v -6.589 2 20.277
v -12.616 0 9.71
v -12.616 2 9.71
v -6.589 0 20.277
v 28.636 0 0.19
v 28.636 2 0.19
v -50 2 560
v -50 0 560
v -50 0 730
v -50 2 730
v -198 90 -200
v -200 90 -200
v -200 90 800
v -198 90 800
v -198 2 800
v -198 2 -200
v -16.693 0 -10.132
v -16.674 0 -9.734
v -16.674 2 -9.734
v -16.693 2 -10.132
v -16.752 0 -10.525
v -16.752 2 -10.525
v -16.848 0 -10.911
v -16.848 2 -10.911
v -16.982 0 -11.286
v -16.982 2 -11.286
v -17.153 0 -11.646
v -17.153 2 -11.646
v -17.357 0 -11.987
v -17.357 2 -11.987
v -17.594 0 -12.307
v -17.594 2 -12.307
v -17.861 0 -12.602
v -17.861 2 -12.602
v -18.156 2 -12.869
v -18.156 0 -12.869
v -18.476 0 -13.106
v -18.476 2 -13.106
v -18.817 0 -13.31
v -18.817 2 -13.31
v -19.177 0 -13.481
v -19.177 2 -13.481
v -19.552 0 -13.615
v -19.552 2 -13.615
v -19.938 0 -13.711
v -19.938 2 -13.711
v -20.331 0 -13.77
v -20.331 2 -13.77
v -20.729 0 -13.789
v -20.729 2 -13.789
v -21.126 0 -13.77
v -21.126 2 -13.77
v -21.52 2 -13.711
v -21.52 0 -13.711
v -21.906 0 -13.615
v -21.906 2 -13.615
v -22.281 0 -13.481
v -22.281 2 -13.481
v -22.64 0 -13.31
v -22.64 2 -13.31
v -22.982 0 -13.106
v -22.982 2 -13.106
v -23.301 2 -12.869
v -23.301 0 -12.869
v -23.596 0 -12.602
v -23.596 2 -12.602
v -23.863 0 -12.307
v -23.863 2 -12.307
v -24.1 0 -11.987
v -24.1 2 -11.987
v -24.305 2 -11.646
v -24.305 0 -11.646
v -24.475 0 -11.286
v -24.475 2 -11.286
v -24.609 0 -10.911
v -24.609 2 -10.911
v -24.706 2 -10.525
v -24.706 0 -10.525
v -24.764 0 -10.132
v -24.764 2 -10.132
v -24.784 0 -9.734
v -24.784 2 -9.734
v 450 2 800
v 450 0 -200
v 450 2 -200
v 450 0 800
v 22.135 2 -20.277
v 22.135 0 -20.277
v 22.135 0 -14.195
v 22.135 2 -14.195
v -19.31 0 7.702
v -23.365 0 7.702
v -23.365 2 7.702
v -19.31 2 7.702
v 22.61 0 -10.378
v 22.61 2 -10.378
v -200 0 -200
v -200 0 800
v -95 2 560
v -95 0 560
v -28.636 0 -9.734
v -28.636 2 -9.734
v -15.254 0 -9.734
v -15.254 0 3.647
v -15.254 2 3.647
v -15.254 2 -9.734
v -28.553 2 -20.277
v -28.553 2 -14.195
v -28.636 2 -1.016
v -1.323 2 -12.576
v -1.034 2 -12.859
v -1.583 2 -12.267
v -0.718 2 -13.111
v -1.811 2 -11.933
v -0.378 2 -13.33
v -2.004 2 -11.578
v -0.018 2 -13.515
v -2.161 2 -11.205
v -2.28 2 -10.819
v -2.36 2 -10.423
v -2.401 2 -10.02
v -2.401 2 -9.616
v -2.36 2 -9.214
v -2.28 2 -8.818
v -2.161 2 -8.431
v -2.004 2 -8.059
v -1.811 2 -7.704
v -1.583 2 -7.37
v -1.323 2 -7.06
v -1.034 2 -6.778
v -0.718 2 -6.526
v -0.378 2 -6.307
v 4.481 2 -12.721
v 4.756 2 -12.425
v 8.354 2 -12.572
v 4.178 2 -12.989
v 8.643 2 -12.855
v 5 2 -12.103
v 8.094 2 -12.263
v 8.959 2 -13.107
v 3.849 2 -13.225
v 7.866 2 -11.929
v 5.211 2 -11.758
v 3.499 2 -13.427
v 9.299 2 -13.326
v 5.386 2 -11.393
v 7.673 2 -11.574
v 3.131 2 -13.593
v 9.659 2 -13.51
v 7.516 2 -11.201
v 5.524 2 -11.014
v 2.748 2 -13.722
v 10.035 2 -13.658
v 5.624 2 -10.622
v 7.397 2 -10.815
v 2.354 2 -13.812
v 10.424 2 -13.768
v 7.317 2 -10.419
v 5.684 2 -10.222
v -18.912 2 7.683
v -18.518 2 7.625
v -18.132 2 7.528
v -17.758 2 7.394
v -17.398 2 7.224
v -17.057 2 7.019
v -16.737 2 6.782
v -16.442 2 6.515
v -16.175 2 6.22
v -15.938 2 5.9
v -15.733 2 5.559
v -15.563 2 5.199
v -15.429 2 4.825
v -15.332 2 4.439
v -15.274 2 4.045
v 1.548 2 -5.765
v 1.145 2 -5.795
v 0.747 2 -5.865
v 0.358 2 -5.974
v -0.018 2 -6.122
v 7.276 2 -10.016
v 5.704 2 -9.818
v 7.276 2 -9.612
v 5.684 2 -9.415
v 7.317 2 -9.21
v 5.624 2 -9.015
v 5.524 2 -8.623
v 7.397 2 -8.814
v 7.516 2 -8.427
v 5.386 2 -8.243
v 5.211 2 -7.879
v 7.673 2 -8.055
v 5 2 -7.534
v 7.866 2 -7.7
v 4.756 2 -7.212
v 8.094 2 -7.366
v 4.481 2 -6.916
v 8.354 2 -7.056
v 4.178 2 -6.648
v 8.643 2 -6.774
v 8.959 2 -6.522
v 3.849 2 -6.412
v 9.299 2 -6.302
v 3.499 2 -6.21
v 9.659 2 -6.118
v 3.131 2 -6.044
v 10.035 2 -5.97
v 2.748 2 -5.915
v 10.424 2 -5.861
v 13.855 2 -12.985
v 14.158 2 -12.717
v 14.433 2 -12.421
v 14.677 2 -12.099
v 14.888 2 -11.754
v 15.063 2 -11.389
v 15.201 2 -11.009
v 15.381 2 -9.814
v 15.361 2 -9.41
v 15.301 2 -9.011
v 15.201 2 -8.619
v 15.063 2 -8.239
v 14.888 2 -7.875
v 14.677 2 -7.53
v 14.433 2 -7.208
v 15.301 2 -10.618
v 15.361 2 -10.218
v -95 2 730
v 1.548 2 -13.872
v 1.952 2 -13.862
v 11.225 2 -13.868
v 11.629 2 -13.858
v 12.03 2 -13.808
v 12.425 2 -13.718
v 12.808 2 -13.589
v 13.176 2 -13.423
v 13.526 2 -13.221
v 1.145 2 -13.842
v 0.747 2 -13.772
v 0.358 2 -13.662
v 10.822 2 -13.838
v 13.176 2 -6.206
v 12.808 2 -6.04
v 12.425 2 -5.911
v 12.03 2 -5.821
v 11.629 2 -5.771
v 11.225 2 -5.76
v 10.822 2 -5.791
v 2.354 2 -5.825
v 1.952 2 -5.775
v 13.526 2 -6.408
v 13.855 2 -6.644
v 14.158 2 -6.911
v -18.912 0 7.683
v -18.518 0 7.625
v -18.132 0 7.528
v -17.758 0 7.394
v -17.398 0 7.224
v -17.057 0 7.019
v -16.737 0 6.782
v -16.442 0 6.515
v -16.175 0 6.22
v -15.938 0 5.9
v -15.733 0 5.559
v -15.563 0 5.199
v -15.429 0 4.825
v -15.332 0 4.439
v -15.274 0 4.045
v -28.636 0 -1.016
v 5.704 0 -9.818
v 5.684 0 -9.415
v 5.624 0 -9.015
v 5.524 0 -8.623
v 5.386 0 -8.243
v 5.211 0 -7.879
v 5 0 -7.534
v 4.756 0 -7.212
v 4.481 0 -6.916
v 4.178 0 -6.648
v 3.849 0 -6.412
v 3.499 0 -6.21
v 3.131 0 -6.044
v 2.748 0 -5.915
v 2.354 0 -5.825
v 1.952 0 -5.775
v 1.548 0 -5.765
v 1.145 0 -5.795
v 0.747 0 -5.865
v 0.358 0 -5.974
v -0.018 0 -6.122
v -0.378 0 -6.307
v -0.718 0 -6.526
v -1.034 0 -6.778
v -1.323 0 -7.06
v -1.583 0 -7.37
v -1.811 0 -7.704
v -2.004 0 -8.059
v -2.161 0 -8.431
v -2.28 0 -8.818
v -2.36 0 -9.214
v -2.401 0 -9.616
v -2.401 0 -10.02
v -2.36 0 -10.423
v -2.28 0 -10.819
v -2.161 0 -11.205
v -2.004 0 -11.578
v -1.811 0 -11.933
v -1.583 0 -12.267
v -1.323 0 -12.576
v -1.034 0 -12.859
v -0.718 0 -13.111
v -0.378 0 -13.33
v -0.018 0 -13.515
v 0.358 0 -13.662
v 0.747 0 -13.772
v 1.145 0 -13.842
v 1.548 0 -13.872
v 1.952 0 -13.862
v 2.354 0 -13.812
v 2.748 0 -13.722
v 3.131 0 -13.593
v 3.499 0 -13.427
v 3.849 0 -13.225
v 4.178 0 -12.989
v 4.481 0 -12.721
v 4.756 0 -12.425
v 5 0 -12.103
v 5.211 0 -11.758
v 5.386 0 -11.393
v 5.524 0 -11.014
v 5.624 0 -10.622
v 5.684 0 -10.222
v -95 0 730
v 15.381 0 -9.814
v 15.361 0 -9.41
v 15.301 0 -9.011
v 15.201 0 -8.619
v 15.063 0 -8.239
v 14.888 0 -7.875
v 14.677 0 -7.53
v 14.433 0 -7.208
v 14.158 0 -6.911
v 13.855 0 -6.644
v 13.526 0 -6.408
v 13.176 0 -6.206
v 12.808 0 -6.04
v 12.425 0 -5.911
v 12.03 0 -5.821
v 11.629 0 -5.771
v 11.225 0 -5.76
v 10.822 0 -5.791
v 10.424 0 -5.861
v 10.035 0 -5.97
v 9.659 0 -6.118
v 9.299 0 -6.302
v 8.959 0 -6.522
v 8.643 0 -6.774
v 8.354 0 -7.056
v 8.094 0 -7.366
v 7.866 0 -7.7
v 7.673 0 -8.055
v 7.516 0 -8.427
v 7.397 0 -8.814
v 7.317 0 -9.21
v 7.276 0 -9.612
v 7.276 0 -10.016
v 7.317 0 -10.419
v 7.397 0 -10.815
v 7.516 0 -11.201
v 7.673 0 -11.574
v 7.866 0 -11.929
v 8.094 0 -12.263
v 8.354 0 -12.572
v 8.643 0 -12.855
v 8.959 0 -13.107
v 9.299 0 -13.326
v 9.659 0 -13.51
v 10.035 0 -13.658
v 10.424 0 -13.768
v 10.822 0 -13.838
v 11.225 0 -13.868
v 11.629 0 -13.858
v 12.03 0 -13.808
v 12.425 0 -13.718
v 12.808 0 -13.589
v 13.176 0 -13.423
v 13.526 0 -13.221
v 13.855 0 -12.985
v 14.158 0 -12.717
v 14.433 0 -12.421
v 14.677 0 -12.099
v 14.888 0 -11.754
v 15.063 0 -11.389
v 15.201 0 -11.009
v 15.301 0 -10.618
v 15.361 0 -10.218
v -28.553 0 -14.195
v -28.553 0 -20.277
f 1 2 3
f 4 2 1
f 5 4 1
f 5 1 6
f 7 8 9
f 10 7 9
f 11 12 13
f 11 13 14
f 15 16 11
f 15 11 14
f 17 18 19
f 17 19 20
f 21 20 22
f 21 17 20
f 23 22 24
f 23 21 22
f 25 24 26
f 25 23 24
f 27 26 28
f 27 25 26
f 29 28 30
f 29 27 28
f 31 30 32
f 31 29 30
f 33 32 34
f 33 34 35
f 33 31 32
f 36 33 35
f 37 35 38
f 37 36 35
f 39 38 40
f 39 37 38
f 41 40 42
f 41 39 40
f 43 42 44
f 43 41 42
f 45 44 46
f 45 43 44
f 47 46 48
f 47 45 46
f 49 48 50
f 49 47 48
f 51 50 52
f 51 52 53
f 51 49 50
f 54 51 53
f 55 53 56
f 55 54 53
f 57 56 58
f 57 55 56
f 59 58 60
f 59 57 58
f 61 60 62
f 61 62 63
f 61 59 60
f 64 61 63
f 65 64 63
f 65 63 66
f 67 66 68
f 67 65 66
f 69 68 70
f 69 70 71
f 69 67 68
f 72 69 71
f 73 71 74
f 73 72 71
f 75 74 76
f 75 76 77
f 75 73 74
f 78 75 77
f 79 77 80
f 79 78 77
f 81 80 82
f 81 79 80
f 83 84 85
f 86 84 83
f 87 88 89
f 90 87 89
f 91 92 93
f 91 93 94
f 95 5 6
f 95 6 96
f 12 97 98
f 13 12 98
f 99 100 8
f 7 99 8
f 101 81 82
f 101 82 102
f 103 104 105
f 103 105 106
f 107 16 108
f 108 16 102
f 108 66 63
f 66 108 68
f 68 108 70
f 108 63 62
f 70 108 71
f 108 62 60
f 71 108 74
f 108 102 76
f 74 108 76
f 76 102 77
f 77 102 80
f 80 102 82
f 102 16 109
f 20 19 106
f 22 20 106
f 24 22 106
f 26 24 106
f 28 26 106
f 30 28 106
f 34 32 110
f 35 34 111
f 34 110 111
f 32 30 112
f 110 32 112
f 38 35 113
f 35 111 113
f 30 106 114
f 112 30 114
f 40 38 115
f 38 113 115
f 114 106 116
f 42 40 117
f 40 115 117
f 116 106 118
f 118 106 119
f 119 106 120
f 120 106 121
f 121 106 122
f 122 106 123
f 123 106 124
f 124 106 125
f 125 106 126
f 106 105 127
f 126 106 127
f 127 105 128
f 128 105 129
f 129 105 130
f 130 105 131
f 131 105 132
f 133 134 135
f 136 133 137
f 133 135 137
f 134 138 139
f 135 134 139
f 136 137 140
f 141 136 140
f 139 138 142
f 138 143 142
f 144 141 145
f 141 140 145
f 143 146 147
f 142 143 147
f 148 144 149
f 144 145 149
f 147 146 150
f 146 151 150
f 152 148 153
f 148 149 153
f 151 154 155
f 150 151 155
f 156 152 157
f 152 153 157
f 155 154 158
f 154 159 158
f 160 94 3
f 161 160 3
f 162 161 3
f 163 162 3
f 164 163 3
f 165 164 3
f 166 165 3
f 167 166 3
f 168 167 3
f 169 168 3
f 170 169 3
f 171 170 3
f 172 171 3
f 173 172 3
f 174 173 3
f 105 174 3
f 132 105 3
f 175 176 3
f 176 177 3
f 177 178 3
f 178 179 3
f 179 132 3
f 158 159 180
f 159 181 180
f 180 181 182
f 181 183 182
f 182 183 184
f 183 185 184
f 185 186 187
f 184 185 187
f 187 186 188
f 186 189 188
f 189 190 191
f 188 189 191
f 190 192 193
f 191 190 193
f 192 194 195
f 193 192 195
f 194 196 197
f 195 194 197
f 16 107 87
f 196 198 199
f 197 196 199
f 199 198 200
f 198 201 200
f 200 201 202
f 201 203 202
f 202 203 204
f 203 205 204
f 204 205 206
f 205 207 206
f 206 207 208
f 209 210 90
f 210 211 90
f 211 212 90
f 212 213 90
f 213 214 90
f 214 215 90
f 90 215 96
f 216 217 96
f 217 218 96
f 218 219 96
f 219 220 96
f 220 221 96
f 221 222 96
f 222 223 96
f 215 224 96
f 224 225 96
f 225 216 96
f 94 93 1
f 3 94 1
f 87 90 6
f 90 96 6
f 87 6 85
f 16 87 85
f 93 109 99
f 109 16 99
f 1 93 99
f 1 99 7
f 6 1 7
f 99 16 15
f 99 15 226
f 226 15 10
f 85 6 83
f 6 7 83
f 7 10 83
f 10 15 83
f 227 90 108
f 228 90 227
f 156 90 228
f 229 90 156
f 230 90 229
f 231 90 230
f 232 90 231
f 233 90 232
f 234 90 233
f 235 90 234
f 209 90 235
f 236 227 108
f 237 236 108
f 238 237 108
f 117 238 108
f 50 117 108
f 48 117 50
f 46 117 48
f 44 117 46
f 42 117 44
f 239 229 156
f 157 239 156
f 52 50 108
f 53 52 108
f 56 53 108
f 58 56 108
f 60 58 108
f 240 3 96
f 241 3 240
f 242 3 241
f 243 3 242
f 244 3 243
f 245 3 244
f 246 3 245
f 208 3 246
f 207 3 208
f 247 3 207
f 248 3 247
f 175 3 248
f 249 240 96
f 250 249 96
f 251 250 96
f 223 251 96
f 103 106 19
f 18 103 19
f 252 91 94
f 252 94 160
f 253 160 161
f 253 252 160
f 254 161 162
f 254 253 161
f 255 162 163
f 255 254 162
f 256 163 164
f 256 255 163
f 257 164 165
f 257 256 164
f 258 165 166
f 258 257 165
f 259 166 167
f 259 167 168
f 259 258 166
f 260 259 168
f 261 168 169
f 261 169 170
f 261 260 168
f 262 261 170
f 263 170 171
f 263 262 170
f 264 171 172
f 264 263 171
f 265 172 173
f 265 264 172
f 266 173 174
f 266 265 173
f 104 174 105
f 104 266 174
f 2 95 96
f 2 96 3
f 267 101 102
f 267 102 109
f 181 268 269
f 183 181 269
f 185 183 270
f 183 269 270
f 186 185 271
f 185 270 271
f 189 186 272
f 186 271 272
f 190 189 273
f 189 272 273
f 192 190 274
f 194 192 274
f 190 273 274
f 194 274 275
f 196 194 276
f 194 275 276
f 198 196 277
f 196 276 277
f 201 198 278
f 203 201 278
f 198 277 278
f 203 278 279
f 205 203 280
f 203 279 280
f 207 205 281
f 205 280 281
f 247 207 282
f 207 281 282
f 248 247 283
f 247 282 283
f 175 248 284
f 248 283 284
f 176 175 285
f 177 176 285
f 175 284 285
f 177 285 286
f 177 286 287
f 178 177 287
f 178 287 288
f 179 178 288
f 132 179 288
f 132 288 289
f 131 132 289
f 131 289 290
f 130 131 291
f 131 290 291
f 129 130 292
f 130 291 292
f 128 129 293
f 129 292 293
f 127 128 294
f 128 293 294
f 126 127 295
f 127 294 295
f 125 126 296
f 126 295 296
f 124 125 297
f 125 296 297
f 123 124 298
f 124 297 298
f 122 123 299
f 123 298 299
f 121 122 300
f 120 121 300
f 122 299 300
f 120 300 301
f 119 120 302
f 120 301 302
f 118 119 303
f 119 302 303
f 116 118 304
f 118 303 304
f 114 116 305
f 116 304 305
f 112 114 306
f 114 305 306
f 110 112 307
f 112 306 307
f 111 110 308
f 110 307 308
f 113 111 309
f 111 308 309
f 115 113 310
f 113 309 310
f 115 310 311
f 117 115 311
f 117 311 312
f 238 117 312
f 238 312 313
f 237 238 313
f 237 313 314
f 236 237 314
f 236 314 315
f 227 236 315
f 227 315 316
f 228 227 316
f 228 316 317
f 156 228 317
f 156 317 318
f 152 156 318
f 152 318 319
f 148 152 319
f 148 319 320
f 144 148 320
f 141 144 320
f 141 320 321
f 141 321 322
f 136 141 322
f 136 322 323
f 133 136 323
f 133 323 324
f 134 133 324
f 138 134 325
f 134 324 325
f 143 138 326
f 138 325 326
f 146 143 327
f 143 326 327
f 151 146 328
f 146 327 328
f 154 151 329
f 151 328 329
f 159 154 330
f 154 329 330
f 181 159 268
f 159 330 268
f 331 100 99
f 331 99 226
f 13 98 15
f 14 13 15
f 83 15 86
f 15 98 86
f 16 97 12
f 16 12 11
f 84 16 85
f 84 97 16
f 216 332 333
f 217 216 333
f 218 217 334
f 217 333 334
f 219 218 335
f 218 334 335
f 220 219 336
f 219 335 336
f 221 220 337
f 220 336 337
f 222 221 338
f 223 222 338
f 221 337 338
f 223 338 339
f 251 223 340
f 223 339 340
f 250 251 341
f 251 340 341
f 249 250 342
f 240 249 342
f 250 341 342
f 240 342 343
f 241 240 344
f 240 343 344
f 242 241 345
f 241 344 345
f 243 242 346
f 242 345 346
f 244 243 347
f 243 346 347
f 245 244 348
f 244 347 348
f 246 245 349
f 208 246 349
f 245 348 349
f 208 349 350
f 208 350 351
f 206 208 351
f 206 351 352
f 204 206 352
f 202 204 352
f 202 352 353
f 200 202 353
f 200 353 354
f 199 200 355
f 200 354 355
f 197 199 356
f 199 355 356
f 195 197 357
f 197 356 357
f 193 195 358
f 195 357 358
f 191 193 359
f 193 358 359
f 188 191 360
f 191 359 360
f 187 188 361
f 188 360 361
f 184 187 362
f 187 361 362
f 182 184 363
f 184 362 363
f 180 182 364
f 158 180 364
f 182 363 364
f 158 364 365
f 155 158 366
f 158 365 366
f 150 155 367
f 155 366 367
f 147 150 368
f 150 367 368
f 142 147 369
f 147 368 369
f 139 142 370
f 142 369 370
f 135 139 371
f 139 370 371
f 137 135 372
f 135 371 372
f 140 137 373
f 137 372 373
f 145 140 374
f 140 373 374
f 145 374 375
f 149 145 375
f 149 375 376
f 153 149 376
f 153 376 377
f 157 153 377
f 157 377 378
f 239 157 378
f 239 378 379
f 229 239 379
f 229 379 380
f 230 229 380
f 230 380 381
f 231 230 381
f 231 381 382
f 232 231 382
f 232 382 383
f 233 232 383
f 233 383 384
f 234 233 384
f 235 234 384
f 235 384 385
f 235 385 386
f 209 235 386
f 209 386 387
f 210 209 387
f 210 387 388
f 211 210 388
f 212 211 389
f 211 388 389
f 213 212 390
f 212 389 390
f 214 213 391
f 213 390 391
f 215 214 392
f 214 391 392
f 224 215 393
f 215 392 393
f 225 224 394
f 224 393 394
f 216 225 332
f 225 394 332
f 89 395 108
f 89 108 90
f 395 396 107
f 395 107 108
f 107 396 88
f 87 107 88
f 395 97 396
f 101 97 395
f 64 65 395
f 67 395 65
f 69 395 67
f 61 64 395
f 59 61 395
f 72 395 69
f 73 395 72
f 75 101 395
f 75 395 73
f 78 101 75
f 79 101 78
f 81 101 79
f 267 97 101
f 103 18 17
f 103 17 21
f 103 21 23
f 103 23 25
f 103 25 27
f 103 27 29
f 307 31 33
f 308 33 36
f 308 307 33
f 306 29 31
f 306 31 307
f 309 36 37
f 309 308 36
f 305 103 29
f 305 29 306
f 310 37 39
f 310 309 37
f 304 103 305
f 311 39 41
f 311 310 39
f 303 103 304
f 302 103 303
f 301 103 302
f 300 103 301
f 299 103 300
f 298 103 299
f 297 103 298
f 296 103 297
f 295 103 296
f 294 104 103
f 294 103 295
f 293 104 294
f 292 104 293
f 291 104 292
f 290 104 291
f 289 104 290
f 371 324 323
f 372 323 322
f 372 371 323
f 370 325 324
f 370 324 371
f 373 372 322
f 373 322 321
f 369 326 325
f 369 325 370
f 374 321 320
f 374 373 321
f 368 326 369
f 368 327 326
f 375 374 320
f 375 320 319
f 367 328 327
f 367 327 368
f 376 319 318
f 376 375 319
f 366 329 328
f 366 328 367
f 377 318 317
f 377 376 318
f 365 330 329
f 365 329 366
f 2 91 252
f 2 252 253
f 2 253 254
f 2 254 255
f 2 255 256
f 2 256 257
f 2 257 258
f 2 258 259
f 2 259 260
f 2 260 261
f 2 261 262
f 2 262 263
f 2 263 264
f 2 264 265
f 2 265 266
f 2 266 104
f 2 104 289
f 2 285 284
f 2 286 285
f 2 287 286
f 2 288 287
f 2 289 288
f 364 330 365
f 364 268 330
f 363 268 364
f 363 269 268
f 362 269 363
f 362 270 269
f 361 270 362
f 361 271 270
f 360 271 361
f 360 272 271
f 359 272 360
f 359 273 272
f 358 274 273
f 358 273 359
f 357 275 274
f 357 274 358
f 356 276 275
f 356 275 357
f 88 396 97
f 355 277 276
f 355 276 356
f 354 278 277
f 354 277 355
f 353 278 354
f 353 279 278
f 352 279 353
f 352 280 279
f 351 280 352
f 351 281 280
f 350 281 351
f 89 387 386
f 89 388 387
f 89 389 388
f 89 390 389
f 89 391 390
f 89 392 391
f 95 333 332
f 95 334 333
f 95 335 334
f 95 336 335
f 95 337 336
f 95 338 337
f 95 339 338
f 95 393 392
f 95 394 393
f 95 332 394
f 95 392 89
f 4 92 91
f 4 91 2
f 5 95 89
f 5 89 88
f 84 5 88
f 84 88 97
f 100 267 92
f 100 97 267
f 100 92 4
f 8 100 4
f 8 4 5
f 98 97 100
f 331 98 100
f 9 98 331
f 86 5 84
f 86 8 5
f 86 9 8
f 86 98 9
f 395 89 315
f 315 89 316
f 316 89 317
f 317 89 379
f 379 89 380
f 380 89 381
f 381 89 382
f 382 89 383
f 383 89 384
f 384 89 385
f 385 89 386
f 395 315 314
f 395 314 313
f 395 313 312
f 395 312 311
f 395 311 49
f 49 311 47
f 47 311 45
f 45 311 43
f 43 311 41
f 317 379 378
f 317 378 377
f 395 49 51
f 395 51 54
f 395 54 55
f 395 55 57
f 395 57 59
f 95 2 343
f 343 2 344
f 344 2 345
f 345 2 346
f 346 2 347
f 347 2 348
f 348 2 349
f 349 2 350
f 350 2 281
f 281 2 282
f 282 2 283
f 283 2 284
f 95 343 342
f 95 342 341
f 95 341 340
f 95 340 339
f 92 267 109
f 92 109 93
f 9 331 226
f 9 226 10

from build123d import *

# Parameters (mm, degrees)
F0_W     = 2
F0_H     = 1000
F1_DEPTH = 90
F0_W_2   = 648
F0_W_3   = 50.688
F0_H_2   = 6.08256
F0_R     = 4.05504
F0_W_4   = 45
F0_H_3   = 170
F2_DEPTH = 2


with BuildPart() as f1:
    # F0 (on Front) → F1 (new body)
    with BuildSketch(Plane.XZ):
        with Locations((-199, 300)):
            Rectangle(F0_W, F0_H)
    extrude(amount=-F1_DEPTH)

    # F0 (on Front) → F2 (join)
    with BuildSketch(Plane.XZ):
        with Locations((126, 300)):
            Rectangle(F0_W_2, F0_H)
        with Locations((-3.208926, -17.236022)):
            Rectangle(F0_W_3, F0_H_2, mode=Mode.SUBTRACT)
        with BuildLine():
            Line((-28.636116, -9.734198), (-28.636116, -1.015862))
            Line((-28.636116, -1.015862), (-23.364564, 7.702474))
            Line((-23.364564, 7.702474), (-19.309524, 7.702474))
            ThreePointArc((-19.309524, 7.702474), (-16.442178, 6.51478), (-15.254484, 3.647434))
            Line((-15.254484, 3.647434), (-15.254484, -9.734198))
            Line((-15.254484, -9.734198), (-16.673748, -9.734198))
            ThreePointArc((-16.673748, -9.734198), (-20.728788, -13.789238), (-24.783828, -9.734198))
            Line((-24.783828, -9.734198), (-28.636116, -9.734198))
        make_face(mode=Mode.SUBTRACT)
        with Locations((1.649359, -9.818369)):
            Circle(F0_R, mode=Mode.SUBTRACT)
        with Locations((11.326316, -9.814243)):
            Circle(F0_R, mode=Mode.SUBTRACT)
        Polygon((22.609892, -10.377738), (-12.615537, 9.709673), (-6.589313, 20.277302), (28.636116, 0.18989), align=None, mode=Mode.SUBTRACT)
        with Locations((-72.5, 645)):
            Rectangle(F0_W_4, F0_H_3, mode=Mode.SUBTRACT)
    extrude(amount=-F2_DEPTH)


solid = f1.part
